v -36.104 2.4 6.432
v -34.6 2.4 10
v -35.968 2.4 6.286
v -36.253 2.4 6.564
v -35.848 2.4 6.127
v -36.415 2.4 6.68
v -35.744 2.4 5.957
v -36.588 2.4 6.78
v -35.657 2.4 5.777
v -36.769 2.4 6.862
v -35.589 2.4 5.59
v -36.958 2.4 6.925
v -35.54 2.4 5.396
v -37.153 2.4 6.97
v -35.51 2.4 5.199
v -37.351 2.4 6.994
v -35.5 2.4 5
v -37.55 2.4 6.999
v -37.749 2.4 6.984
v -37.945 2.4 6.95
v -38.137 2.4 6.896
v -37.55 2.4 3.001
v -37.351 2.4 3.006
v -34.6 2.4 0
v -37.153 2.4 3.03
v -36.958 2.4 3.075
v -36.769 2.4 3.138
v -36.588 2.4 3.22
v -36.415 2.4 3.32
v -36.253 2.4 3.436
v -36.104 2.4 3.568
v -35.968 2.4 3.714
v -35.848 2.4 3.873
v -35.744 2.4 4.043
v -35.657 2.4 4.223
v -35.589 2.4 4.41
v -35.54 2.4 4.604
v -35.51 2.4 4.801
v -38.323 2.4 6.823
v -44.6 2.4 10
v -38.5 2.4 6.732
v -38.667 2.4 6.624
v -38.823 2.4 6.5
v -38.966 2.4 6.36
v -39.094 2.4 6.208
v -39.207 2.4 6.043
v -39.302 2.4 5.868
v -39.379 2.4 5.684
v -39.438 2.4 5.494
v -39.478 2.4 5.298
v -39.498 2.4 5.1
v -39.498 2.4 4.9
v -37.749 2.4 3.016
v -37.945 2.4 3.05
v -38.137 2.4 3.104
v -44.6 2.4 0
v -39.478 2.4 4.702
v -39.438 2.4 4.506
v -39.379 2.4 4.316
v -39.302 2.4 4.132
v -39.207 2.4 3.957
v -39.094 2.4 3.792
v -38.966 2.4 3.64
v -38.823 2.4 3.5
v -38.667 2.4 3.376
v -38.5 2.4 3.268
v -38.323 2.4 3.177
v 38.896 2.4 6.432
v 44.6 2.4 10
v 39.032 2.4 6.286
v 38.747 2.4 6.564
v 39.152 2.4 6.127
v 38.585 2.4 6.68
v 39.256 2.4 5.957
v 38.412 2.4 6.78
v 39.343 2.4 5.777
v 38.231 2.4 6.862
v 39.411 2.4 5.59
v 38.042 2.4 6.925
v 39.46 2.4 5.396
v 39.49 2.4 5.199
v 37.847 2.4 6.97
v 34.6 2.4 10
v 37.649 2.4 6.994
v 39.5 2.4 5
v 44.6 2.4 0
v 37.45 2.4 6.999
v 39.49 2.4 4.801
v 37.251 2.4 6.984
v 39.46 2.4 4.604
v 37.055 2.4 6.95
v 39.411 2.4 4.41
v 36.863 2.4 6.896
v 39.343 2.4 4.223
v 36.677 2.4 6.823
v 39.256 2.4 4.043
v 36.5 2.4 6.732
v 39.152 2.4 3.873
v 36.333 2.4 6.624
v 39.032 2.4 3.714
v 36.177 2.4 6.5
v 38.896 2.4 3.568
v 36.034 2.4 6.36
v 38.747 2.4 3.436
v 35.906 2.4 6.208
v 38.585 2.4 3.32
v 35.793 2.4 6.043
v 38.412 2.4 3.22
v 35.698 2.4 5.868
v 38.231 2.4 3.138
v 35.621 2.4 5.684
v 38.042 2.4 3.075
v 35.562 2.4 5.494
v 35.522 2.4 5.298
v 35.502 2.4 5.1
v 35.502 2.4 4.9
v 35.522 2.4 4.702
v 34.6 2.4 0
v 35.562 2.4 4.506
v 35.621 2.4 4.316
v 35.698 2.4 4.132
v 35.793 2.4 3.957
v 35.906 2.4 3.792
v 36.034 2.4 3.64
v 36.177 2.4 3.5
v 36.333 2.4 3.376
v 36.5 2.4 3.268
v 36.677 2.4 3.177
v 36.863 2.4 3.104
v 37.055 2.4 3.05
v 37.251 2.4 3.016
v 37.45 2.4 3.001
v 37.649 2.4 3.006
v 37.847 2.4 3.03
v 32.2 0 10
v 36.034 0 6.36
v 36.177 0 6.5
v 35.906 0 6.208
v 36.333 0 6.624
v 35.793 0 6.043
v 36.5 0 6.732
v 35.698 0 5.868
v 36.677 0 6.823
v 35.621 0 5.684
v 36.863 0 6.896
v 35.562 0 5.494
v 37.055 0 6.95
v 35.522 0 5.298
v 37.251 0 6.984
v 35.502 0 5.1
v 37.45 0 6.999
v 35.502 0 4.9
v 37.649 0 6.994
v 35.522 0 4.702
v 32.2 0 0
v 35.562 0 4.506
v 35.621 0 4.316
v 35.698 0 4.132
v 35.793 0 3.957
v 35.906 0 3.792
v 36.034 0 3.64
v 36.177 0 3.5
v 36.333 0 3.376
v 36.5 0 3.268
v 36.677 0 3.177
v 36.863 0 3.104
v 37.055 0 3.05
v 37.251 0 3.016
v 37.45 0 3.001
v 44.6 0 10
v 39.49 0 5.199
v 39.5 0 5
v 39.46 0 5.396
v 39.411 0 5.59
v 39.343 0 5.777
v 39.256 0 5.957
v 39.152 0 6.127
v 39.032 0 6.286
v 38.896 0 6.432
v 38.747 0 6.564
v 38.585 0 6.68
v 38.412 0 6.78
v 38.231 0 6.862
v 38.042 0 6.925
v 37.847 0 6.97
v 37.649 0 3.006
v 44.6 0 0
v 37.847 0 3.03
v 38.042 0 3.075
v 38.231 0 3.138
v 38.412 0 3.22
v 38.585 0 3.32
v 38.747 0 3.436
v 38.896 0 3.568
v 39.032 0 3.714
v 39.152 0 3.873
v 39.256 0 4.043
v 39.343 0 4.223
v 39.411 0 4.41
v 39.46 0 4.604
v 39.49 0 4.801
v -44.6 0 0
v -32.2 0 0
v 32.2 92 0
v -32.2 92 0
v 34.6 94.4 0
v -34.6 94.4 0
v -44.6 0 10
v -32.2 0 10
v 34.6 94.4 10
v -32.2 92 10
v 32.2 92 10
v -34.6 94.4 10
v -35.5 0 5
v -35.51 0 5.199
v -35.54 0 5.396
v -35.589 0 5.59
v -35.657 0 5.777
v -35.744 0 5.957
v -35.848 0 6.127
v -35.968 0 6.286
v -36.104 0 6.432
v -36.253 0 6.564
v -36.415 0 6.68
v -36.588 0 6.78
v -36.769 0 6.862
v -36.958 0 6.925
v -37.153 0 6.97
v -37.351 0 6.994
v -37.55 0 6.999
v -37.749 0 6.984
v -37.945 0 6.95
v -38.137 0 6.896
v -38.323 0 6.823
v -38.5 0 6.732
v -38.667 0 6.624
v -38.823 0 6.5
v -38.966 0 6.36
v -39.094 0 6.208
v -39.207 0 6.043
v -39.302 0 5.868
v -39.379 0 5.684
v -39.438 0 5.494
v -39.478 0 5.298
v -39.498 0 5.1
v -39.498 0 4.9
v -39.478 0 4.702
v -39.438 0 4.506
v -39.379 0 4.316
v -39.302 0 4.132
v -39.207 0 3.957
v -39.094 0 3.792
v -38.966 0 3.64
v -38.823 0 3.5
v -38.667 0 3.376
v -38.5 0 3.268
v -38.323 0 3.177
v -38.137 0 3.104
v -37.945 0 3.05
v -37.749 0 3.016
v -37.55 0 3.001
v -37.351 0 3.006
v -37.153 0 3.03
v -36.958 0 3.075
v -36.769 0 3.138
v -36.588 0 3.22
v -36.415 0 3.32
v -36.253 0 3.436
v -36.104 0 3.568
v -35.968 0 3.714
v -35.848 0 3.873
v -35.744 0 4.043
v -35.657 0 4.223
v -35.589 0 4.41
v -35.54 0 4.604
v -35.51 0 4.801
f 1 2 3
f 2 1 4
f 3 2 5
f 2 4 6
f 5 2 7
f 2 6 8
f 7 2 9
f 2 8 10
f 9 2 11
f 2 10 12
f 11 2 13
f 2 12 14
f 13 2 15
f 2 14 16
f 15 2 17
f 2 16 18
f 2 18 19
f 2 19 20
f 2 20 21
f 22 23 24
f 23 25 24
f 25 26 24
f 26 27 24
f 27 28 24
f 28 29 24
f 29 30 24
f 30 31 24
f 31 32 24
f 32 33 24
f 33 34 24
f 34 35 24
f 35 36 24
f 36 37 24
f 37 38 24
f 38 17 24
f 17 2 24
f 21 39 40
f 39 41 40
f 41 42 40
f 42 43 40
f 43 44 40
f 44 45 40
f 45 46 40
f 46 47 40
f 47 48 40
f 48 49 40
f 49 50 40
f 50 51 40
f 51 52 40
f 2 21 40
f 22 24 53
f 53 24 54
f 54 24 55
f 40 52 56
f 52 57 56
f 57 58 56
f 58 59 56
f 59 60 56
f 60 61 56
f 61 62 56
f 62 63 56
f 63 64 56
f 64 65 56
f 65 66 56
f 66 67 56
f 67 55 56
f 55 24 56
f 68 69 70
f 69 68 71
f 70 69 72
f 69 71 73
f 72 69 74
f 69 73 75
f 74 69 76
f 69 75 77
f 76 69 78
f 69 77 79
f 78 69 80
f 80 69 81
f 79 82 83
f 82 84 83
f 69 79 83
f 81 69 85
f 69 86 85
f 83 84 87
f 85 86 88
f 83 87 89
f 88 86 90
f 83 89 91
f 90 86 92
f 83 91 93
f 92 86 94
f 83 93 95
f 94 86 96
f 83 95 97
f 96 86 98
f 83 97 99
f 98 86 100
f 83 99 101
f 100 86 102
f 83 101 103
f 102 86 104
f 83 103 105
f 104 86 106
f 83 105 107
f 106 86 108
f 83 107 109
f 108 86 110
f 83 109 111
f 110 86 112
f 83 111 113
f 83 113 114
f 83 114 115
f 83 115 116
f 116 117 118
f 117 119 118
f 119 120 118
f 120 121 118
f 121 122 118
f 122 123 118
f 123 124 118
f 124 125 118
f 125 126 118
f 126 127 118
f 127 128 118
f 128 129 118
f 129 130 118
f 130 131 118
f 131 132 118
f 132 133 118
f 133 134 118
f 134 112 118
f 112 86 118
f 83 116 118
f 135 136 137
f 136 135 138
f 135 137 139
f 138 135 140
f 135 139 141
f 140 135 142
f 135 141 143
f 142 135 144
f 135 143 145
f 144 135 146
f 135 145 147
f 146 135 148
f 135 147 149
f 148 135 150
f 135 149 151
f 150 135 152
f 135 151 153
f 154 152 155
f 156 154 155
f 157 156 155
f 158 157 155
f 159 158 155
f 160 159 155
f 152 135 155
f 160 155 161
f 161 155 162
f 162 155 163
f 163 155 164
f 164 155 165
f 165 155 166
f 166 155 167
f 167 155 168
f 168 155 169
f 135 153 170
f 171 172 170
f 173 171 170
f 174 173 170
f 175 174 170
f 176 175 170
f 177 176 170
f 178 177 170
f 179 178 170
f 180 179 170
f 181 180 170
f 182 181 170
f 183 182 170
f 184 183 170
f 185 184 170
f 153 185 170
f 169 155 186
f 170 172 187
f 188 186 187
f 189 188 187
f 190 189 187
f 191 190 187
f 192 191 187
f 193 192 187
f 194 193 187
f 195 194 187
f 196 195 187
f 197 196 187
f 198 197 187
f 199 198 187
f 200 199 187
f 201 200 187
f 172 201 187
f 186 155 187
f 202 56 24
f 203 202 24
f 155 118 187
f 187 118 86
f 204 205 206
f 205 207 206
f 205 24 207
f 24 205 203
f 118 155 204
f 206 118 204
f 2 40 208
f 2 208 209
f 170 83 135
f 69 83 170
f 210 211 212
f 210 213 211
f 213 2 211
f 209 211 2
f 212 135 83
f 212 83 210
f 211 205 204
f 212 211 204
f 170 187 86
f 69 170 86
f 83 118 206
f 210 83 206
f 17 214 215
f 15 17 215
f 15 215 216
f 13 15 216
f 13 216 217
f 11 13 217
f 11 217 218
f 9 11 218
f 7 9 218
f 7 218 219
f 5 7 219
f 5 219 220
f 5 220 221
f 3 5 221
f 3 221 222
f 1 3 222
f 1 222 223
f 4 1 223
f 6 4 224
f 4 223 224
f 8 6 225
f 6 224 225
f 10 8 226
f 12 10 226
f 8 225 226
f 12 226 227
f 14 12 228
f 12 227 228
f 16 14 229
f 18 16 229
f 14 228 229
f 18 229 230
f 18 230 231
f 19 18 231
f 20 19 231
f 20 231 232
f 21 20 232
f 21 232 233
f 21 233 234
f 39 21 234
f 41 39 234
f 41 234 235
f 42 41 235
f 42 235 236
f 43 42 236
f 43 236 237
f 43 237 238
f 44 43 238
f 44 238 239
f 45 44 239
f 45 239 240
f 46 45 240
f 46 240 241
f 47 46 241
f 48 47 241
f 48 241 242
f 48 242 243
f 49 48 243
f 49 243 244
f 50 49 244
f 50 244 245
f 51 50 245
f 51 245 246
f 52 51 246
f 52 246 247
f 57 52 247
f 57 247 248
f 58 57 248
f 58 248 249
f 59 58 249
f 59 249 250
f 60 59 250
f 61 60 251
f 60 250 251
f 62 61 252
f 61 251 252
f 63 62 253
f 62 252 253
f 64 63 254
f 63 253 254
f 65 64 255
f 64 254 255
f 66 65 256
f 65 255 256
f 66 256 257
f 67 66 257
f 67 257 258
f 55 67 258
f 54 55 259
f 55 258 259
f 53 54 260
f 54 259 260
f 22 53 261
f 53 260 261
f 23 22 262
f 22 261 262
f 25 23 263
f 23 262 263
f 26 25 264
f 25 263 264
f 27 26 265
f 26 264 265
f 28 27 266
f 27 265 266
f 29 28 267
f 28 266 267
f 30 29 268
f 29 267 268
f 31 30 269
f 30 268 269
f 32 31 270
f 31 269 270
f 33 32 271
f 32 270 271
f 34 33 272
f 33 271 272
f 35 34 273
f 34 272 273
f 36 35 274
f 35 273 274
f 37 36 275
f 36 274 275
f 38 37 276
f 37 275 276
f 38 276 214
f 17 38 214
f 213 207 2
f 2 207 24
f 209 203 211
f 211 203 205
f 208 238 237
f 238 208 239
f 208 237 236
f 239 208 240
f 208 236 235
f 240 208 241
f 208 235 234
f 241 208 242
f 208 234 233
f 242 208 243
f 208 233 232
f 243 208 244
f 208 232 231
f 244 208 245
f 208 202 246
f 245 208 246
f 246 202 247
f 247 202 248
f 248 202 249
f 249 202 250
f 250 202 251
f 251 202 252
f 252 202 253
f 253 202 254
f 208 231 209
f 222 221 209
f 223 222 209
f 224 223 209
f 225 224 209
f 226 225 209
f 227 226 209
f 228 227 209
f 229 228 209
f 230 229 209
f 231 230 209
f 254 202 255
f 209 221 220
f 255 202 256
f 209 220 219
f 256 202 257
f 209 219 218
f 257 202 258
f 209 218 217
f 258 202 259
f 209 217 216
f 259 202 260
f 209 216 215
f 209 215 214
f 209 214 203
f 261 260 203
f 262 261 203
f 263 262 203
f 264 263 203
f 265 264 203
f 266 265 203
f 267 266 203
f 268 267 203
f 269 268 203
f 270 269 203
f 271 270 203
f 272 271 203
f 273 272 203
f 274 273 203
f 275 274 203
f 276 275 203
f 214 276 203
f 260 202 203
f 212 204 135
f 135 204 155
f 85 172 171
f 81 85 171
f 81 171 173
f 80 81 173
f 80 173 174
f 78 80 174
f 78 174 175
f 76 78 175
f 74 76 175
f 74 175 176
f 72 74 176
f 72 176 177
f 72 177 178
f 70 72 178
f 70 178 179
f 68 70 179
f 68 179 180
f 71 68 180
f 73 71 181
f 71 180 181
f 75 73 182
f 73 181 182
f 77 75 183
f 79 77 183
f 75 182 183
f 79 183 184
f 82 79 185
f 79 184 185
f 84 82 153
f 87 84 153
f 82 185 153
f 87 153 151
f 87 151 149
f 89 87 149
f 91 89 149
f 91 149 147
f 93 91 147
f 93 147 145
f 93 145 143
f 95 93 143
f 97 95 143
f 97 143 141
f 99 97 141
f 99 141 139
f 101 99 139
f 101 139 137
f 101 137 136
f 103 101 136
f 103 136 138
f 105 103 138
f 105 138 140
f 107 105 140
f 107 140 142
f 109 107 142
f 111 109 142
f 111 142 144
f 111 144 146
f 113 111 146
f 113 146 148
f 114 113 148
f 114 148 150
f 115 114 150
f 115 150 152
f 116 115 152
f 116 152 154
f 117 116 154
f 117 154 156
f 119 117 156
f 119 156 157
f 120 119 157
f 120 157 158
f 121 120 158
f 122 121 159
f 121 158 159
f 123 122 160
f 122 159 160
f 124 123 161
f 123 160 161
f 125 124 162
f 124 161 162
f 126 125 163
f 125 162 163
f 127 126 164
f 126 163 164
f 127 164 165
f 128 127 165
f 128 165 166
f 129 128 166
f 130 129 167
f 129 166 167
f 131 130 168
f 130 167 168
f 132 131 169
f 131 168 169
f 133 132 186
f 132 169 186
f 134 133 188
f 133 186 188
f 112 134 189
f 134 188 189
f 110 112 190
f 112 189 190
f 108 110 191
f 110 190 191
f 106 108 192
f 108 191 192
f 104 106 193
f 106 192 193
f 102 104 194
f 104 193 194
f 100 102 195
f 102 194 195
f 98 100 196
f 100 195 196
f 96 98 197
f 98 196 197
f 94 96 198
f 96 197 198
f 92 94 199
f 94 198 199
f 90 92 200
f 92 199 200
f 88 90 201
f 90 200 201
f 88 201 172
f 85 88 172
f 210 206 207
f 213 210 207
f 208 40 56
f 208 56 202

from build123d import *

# Parameters (mm, degrees)
PAD_DEPTH    = 10
SKETCH001_R  = 2
POCKET_DEPTH = 5


with BuildPart() as part:
    # Sketch → Pad (new body)
    with BuildSketch(Plane.XY):
        Polygon((34.6, 94.4), (-34.6, 94.4), (-34.6, 2.4), (-44.6, 2.4), (-44.6, 0), (-32.2, 0), (-32.2, 92), (32.2, 92), (32.2, 0), (44.6, 0), (44.6, 2.4), (34.6, 2.4), align=None)
    extrude(amount=PAD_DEPTH)

    # Sketch001 → Pocket (cut)
    with BuildSketch(Plane.XZ):
        with Locations((-37.5, 5)):
            Circle(SKETCH001_R)
        with Locations((37.5, 5)):
            Circle(SKETCH001_R)
    extrude(amount=-POCKET_DEPTH, mode=Mode.SUBTRACT)


solid = part.part
